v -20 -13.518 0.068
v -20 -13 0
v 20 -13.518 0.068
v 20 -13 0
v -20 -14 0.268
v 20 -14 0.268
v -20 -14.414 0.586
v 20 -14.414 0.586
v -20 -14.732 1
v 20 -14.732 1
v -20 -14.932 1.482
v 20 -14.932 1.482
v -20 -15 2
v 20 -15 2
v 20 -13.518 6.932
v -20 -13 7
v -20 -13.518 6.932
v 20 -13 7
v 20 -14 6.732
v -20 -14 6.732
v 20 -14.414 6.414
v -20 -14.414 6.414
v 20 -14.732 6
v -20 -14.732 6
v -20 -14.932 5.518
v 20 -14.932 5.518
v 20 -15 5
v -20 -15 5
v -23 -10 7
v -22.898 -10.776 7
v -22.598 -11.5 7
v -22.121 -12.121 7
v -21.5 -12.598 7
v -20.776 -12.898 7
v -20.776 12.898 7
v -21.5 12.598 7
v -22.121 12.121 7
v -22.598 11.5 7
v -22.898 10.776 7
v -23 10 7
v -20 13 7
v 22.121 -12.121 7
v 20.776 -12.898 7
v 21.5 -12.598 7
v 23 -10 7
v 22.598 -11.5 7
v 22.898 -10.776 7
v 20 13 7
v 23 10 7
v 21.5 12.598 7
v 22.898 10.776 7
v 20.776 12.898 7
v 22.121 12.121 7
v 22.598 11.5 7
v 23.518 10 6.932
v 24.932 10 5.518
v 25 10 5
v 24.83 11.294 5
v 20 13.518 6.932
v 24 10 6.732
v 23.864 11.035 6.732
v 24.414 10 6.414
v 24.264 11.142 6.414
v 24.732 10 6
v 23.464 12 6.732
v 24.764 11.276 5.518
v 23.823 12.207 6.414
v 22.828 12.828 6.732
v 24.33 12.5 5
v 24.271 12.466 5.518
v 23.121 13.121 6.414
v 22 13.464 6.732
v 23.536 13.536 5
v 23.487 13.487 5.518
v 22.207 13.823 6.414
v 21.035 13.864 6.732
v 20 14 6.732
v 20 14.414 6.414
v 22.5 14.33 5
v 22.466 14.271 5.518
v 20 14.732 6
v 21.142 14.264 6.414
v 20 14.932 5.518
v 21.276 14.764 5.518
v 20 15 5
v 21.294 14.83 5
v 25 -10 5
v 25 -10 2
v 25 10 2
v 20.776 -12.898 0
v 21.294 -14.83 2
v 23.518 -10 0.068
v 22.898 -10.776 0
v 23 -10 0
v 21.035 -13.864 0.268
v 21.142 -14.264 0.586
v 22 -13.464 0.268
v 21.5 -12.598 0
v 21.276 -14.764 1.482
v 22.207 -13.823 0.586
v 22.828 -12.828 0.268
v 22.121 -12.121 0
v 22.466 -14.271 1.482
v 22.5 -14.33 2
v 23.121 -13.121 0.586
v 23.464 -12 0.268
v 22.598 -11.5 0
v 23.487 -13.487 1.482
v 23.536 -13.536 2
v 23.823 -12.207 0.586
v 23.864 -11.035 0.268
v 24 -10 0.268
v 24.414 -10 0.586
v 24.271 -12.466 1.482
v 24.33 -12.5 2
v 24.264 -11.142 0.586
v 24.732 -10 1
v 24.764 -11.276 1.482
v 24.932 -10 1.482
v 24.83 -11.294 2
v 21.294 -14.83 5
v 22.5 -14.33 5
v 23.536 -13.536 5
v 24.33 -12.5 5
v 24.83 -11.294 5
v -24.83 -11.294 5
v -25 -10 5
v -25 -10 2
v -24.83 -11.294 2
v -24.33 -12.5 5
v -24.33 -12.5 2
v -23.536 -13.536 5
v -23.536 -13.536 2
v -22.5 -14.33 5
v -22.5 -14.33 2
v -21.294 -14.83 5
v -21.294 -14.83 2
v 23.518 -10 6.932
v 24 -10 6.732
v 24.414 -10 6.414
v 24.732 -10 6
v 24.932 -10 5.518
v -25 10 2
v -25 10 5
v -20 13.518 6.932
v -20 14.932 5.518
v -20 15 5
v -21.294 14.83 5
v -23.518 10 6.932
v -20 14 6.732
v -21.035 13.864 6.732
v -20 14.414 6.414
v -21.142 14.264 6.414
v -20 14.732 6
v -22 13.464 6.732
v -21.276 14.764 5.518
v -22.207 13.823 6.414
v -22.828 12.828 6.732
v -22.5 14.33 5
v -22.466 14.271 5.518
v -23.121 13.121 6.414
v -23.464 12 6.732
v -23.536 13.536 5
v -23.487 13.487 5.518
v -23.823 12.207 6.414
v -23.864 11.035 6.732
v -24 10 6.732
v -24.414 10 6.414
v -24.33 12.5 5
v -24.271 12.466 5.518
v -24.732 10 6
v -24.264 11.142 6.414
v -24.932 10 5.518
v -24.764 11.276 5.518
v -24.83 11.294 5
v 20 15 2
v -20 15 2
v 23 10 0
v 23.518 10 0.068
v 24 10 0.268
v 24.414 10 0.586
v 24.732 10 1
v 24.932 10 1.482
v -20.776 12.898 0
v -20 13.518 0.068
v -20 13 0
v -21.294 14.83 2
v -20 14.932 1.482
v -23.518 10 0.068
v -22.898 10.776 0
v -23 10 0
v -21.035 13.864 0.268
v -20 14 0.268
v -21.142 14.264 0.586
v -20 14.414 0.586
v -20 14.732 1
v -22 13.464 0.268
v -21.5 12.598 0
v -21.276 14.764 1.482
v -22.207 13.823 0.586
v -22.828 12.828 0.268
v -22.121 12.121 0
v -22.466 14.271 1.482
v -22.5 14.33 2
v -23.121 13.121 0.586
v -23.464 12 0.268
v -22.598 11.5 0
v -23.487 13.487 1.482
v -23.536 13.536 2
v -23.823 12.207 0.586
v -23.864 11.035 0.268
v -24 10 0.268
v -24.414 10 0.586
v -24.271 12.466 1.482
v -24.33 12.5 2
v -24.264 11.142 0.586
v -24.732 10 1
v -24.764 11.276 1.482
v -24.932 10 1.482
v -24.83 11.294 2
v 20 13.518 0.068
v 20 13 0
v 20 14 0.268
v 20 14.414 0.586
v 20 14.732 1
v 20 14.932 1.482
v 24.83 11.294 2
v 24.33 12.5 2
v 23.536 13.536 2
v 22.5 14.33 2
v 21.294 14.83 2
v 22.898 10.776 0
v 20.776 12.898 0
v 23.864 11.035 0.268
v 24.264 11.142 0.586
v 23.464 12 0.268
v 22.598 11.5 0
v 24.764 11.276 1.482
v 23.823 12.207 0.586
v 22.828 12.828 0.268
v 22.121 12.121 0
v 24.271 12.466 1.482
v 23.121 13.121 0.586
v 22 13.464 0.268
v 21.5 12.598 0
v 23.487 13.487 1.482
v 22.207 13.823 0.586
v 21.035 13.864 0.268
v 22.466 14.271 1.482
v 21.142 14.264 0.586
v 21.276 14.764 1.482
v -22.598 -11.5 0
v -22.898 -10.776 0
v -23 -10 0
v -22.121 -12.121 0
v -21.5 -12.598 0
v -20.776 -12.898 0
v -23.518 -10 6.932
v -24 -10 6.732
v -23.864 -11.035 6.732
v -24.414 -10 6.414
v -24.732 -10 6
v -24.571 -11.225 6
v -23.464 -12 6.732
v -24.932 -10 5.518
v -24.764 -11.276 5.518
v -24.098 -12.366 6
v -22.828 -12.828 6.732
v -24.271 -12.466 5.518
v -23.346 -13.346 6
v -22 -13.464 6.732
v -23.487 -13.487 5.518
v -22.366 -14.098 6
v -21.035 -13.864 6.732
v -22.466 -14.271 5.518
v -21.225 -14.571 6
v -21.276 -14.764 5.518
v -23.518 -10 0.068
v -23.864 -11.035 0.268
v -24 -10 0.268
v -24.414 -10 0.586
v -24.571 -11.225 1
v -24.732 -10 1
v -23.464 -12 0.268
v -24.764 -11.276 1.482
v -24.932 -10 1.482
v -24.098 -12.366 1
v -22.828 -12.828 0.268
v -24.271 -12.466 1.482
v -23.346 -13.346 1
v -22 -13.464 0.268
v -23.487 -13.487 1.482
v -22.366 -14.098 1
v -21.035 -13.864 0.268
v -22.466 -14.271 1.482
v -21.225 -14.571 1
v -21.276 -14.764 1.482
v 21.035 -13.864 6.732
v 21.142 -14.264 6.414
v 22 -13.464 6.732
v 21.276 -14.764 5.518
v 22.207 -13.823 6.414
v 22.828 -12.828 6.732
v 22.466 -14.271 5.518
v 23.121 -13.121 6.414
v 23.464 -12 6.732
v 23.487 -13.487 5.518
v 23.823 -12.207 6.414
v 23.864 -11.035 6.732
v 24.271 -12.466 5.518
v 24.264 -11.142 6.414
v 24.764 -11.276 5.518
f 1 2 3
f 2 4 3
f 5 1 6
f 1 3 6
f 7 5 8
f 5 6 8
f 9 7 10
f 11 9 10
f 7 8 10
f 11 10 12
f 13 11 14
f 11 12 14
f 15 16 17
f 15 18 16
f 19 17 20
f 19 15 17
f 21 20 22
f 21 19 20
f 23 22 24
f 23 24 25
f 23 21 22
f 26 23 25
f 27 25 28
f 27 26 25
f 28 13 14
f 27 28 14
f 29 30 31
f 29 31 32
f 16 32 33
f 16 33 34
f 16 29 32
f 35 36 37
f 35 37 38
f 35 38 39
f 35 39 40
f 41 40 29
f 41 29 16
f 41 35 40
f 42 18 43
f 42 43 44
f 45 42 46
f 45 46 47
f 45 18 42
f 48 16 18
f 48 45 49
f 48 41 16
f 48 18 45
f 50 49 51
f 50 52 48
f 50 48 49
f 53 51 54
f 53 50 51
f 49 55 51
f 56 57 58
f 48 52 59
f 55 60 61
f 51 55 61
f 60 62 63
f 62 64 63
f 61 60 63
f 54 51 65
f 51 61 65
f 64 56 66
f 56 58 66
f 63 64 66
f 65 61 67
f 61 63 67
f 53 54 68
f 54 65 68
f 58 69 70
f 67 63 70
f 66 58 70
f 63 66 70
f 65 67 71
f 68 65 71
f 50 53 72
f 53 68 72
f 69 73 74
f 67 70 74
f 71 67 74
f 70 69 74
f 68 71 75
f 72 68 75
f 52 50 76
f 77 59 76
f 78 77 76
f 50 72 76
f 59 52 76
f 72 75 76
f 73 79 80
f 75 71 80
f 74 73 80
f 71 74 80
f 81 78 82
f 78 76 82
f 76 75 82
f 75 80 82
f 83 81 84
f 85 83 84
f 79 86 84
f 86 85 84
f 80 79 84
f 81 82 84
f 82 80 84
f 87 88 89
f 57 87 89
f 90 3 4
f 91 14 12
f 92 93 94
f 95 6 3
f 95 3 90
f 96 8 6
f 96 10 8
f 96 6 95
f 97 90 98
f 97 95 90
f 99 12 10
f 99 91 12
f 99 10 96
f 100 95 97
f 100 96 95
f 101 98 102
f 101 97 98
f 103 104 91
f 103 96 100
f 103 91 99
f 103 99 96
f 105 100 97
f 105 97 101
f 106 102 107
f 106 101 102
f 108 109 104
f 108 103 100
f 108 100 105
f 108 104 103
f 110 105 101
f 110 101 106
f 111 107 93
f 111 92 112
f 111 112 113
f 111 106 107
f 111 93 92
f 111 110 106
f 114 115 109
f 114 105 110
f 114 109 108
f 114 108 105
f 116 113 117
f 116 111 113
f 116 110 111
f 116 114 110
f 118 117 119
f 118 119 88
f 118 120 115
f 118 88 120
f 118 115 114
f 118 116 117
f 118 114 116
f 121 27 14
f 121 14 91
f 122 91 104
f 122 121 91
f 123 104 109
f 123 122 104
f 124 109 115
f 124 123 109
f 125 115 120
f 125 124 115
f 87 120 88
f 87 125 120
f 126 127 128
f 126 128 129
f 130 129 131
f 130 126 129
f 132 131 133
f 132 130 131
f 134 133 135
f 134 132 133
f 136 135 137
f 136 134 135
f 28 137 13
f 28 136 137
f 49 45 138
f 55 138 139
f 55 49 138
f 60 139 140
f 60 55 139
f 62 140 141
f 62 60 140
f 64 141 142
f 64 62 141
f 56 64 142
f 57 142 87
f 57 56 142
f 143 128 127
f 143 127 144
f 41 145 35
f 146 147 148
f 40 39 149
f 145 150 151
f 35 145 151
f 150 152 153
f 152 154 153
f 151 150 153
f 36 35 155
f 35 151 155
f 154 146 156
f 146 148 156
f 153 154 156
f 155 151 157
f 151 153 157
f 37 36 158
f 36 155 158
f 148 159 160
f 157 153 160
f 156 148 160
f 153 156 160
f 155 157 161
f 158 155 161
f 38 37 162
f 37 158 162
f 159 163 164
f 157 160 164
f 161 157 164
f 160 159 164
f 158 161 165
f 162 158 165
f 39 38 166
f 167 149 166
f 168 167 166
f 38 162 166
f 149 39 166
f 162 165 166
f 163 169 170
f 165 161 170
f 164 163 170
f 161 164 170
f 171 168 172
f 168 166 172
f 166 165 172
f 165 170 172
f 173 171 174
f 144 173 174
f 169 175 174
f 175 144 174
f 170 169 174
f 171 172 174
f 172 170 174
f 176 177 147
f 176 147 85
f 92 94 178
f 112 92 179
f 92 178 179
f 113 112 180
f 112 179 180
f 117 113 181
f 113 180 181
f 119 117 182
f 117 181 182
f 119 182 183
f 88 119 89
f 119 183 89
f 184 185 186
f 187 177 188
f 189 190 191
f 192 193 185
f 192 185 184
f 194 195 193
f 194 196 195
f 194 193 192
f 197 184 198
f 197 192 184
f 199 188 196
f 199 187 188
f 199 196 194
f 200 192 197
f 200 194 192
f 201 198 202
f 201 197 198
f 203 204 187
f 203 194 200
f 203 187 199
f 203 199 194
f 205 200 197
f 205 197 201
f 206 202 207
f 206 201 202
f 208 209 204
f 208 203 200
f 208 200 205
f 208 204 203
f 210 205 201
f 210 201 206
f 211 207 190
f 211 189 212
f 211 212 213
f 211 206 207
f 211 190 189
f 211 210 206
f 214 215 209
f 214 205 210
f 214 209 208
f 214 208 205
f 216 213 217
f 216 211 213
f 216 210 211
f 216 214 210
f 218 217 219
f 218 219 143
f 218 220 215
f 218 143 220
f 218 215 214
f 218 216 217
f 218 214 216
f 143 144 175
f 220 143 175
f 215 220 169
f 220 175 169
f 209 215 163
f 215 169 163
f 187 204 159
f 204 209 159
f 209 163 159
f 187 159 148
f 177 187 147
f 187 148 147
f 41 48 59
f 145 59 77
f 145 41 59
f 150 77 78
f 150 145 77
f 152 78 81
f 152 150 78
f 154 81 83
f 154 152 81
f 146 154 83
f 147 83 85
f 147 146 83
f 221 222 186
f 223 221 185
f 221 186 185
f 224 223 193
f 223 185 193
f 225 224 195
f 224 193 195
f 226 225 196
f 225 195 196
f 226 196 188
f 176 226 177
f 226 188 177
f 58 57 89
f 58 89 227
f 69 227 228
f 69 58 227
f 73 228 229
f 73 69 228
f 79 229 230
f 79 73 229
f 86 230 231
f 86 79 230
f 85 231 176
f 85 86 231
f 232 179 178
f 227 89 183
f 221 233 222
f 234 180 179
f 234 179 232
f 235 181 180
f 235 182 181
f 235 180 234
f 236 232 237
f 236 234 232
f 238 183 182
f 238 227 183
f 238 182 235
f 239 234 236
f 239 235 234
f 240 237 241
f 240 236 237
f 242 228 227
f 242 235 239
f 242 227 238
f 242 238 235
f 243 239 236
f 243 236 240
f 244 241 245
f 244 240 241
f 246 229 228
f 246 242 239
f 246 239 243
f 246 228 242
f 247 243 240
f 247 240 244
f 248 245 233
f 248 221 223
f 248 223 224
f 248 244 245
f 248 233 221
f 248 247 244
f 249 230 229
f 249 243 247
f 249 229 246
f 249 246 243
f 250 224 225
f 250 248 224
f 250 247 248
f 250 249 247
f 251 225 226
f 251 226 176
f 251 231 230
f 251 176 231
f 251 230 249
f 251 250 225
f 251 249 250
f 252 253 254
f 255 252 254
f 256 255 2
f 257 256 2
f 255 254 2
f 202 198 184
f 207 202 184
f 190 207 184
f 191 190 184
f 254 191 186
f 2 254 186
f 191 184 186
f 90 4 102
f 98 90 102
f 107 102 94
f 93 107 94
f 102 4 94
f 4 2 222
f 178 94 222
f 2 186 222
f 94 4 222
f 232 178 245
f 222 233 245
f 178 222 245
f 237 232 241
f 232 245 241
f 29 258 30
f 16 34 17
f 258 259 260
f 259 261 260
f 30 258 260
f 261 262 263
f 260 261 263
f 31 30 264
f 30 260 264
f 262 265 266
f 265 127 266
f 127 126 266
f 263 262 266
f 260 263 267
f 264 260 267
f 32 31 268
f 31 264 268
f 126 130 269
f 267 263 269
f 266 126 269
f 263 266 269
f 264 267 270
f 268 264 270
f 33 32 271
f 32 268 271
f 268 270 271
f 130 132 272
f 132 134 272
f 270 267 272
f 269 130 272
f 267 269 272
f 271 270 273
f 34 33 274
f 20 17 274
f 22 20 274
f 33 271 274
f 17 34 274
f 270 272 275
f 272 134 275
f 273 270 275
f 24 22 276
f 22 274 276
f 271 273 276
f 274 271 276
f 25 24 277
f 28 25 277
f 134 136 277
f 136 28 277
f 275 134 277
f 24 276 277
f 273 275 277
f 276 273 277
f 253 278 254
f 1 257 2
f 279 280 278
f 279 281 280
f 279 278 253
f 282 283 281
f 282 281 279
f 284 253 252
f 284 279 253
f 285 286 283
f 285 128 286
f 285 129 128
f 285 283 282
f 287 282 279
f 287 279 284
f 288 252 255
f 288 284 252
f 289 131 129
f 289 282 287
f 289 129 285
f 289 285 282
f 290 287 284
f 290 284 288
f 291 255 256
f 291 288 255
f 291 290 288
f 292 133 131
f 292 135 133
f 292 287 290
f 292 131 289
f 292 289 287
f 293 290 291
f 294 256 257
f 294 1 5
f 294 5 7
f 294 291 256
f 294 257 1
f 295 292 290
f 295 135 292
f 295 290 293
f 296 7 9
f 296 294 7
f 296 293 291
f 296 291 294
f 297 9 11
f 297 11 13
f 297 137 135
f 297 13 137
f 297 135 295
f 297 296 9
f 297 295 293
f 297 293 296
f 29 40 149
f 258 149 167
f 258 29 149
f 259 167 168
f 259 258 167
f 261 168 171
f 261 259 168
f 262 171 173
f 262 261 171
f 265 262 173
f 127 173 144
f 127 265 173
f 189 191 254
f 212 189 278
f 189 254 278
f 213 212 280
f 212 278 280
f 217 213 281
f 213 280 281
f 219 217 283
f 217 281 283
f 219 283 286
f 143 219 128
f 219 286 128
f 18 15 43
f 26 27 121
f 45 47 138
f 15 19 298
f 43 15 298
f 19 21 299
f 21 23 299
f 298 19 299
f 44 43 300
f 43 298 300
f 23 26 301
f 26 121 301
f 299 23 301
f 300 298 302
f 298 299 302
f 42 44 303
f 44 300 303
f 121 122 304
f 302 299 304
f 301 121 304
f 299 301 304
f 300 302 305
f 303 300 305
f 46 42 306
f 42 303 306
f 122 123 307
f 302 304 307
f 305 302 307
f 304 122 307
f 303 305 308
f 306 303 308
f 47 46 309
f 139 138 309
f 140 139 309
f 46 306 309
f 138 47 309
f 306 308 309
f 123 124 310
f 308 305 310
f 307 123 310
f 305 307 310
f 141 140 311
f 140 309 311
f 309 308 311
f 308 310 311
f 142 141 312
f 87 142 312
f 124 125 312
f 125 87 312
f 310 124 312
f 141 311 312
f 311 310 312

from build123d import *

# Parameters (mm, degrees)
F0_W     = 50
F0_H     = 30
F1_DEPTH = 7
F2_R     = 5
F3_R     = 2


with BuildPart() as f1:
    # F0 (on Top) → F1 (new body)
    with BuildSketch(Plane.XY):
        Rectangle(F0_W, F0_H)
    extrude(amount=F1_DEPTH)

    # F2
    f2_edges = [f1.edges().sort_by_distance(p)[0] for p in [
        (25, -15, 3.5),
        (-25, -15, 3.5),
        (25, 15, 3.5),
        (-25, 15, 3.5),
    ]]
    fillet(f2_edges, radius=F2_R)

    # F3
    f3_edges = [f1.edges().sort_by_distance(p)[0] for p in [
        (0, -15, 7),
        (0, -15, 0),
    ]]
    fillet(f3_edges, radius=F3_R)


solid = f1.part
